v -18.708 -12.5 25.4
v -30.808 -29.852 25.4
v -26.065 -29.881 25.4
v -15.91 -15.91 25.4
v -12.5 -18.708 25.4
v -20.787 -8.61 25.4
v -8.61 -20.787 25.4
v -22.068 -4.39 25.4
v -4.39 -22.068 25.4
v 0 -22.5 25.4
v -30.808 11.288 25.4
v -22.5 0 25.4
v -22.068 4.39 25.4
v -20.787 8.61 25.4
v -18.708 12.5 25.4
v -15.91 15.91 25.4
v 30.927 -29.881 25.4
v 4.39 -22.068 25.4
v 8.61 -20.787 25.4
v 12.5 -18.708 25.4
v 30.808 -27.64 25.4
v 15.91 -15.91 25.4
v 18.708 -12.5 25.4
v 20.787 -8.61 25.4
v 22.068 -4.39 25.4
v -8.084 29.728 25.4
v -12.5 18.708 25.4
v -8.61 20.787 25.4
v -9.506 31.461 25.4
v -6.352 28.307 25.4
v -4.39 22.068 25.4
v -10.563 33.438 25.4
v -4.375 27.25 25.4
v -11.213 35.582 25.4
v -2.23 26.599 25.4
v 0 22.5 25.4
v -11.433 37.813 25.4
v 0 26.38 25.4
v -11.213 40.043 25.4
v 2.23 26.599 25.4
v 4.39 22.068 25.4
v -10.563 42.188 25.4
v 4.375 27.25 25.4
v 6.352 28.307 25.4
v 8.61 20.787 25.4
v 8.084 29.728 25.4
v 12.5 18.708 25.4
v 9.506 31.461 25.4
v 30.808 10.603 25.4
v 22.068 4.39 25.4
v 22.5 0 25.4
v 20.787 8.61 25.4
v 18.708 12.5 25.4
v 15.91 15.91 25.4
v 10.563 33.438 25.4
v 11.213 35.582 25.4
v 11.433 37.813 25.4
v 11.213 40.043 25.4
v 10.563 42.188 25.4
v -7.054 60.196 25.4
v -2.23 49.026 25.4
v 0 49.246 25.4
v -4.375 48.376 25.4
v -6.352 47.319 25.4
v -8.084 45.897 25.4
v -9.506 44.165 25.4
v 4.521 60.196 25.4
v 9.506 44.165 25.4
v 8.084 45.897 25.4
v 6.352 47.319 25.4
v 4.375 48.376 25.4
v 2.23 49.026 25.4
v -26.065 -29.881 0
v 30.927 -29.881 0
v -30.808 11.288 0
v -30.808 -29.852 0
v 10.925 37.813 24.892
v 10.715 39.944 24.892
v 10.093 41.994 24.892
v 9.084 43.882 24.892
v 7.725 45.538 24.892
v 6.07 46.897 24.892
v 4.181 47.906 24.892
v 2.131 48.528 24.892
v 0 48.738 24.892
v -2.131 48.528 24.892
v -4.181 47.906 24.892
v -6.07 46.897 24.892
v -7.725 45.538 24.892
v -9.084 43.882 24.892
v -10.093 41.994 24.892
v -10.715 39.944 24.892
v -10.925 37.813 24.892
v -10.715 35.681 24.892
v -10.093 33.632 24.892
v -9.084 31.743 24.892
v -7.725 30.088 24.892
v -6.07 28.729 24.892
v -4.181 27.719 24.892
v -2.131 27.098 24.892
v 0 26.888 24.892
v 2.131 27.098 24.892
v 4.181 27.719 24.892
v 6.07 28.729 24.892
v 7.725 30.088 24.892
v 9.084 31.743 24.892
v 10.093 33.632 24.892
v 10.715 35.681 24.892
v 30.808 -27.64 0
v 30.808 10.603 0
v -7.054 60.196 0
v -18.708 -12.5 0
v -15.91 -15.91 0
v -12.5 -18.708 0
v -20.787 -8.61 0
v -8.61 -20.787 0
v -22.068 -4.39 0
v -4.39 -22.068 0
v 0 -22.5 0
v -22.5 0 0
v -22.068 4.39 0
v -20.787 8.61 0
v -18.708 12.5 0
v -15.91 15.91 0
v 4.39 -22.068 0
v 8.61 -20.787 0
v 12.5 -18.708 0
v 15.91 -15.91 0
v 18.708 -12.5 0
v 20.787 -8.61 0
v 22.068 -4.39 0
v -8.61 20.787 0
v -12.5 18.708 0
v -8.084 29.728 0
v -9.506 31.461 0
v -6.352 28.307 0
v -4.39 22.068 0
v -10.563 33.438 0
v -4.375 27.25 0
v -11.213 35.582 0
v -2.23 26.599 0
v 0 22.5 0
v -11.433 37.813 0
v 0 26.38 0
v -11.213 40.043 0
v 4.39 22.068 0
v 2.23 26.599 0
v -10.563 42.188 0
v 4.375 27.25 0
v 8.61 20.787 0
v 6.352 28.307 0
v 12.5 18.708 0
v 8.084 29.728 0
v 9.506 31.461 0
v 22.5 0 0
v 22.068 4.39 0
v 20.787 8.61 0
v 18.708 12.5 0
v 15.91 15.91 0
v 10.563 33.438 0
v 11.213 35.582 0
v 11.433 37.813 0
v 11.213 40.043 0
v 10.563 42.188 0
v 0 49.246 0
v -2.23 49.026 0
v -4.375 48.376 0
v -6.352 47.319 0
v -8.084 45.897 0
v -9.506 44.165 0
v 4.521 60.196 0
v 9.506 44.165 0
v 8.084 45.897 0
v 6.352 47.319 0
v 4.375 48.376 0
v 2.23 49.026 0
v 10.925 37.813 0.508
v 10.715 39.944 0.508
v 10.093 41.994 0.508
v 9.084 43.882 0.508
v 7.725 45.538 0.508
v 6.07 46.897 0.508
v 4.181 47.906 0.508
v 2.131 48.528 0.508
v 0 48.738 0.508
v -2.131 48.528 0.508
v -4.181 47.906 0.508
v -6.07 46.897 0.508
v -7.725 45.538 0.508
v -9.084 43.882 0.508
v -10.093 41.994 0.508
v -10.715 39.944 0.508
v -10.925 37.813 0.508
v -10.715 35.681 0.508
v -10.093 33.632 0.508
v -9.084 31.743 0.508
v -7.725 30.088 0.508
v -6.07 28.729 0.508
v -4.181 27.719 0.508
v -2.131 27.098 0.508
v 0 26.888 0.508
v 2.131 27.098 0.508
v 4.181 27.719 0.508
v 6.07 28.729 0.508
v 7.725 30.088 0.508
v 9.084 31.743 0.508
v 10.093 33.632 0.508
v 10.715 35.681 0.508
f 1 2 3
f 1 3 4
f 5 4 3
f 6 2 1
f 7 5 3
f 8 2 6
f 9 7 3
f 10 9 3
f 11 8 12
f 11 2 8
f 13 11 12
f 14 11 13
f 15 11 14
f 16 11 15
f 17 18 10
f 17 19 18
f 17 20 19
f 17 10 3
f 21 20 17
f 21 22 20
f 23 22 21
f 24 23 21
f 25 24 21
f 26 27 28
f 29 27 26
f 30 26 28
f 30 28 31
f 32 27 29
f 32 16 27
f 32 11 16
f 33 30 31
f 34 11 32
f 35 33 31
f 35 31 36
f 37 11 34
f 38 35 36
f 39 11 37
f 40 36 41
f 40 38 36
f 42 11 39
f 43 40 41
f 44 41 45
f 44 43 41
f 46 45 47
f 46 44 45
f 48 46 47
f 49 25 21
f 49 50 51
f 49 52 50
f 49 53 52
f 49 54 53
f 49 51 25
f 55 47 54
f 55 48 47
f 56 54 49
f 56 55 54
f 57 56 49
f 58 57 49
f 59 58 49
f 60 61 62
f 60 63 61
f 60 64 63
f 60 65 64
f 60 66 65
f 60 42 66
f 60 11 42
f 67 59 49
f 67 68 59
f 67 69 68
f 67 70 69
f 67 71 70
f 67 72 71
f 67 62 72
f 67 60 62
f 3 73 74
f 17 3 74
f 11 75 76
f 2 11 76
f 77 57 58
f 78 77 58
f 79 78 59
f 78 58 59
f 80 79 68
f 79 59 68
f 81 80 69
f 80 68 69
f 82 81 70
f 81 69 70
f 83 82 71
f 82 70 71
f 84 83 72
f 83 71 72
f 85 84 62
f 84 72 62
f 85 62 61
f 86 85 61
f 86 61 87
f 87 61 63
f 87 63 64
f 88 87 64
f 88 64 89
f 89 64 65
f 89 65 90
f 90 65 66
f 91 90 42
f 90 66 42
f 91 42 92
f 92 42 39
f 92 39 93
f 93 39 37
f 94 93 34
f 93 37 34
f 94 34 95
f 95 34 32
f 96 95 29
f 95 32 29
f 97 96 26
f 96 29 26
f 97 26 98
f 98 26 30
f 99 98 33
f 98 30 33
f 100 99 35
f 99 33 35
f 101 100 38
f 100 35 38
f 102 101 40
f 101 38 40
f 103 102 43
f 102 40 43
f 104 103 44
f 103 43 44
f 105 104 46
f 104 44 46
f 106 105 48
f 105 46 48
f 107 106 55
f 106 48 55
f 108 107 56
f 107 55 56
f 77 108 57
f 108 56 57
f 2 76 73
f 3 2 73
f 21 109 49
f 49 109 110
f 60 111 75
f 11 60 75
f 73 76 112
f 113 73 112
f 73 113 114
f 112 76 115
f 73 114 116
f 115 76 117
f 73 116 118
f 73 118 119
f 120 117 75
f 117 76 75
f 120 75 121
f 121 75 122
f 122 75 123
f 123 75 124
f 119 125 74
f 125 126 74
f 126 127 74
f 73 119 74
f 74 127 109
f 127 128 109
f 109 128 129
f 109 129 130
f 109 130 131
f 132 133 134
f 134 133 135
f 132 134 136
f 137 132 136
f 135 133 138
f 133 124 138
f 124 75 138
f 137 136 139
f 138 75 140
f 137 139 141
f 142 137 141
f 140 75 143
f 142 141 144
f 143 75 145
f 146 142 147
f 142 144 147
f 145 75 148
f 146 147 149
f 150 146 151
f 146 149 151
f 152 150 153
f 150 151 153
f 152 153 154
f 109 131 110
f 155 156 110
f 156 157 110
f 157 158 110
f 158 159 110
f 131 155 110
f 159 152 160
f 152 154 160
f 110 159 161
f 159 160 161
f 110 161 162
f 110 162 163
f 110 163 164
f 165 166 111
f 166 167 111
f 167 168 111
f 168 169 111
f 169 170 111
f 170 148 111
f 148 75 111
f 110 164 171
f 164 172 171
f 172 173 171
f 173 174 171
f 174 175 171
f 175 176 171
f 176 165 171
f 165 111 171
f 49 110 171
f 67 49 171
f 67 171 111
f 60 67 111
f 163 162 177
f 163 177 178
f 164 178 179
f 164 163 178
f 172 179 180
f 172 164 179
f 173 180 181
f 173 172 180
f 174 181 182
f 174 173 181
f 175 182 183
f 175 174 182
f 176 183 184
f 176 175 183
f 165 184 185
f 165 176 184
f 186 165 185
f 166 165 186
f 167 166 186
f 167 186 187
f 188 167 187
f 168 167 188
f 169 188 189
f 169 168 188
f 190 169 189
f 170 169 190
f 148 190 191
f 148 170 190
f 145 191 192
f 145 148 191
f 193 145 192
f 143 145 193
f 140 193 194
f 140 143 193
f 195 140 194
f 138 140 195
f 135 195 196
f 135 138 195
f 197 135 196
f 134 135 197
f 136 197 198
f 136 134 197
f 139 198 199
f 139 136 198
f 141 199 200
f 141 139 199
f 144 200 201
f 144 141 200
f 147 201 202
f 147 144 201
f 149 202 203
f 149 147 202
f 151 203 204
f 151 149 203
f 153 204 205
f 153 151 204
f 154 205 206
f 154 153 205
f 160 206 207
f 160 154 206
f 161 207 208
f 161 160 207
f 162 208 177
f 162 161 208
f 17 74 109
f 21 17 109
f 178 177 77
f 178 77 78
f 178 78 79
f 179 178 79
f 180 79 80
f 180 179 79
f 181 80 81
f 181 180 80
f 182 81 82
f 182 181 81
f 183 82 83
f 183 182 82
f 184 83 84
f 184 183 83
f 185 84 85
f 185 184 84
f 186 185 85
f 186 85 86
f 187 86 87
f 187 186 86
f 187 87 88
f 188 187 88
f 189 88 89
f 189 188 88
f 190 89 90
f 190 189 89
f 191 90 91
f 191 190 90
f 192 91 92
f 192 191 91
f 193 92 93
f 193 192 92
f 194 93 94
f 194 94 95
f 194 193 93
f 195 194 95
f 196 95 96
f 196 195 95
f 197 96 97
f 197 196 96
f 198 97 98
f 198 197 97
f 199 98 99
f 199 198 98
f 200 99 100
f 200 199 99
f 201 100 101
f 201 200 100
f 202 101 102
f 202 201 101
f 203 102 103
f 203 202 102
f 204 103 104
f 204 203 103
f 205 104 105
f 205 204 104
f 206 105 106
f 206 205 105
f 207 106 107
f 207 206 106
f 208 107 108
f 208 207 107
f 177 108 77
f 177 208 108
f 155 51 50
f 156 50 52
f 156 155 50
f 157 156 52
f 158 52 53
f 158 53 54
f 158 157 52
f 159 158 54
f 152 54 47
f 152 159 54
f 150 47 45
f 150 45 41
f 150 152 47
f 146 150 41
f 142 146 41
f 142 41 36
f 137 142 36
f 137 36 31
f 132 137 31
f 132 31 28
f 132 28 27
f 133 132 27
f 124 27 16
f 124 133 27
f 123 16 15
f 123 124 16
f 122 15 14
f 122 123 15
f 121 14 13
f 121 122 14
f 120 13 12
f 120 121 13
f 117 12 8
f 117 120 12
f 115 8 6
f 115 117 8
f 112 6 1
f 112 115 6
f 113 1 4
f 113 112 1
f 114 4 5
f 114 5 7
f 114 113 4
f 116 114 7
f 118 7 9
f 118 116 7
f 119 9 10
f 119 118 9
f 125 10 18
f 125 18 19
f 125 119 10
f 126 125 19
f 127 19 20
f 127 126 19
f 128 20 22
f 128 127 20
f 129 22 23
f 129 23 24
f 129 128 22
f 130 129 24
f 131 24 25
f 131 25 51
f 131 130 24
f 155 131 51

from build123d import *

# Parameters (mm, degrees)
F0_R     = 22.5
F0_R_2   = 10.925
F1_DEPTH = 25.4
F2_SIZE  = 0.508
F3_SIZE  = 0.508


with BuildPart() as f1:
    # F0 (on Top) → F1 (new body)
    with BuildSketch(Plane.XY):
        Polygon((30.807892, 10.602966), (4.521396, 60.1965), (-7.053799, 60.1965), (-30.807892, 11.287956), (-30.807892, -23.549838), (-30.807892, -29.851647), (-26.064852, -29.880841), (30.927461, -29.880841), (30.807892, -27.640185), align=None)
        Circle(F0_R, mode=Mode.SUBTRACT)
        with Locations((0, 37.812808)):
            Circle(F0_R_2, mode=Mode.SUBTRACT)
    extrude(amount=F1_DEPTH)

    # F2
    f2_edges = [f1.edges().sort_by_distance(p)[0] for p in [
        (-10.925, 37.812808, 0),
    ]]
    chamfer(f2_edges, length=F2_SIZE)

    # F3
    f3_edges = [f1.edges().sort_by_distance(p)[0] for p in [
        (-10.925, 37.812808, 25.4),
    ]]
    chamfer(f3_edges, length=F3_SIZE)


solid = f1.part
